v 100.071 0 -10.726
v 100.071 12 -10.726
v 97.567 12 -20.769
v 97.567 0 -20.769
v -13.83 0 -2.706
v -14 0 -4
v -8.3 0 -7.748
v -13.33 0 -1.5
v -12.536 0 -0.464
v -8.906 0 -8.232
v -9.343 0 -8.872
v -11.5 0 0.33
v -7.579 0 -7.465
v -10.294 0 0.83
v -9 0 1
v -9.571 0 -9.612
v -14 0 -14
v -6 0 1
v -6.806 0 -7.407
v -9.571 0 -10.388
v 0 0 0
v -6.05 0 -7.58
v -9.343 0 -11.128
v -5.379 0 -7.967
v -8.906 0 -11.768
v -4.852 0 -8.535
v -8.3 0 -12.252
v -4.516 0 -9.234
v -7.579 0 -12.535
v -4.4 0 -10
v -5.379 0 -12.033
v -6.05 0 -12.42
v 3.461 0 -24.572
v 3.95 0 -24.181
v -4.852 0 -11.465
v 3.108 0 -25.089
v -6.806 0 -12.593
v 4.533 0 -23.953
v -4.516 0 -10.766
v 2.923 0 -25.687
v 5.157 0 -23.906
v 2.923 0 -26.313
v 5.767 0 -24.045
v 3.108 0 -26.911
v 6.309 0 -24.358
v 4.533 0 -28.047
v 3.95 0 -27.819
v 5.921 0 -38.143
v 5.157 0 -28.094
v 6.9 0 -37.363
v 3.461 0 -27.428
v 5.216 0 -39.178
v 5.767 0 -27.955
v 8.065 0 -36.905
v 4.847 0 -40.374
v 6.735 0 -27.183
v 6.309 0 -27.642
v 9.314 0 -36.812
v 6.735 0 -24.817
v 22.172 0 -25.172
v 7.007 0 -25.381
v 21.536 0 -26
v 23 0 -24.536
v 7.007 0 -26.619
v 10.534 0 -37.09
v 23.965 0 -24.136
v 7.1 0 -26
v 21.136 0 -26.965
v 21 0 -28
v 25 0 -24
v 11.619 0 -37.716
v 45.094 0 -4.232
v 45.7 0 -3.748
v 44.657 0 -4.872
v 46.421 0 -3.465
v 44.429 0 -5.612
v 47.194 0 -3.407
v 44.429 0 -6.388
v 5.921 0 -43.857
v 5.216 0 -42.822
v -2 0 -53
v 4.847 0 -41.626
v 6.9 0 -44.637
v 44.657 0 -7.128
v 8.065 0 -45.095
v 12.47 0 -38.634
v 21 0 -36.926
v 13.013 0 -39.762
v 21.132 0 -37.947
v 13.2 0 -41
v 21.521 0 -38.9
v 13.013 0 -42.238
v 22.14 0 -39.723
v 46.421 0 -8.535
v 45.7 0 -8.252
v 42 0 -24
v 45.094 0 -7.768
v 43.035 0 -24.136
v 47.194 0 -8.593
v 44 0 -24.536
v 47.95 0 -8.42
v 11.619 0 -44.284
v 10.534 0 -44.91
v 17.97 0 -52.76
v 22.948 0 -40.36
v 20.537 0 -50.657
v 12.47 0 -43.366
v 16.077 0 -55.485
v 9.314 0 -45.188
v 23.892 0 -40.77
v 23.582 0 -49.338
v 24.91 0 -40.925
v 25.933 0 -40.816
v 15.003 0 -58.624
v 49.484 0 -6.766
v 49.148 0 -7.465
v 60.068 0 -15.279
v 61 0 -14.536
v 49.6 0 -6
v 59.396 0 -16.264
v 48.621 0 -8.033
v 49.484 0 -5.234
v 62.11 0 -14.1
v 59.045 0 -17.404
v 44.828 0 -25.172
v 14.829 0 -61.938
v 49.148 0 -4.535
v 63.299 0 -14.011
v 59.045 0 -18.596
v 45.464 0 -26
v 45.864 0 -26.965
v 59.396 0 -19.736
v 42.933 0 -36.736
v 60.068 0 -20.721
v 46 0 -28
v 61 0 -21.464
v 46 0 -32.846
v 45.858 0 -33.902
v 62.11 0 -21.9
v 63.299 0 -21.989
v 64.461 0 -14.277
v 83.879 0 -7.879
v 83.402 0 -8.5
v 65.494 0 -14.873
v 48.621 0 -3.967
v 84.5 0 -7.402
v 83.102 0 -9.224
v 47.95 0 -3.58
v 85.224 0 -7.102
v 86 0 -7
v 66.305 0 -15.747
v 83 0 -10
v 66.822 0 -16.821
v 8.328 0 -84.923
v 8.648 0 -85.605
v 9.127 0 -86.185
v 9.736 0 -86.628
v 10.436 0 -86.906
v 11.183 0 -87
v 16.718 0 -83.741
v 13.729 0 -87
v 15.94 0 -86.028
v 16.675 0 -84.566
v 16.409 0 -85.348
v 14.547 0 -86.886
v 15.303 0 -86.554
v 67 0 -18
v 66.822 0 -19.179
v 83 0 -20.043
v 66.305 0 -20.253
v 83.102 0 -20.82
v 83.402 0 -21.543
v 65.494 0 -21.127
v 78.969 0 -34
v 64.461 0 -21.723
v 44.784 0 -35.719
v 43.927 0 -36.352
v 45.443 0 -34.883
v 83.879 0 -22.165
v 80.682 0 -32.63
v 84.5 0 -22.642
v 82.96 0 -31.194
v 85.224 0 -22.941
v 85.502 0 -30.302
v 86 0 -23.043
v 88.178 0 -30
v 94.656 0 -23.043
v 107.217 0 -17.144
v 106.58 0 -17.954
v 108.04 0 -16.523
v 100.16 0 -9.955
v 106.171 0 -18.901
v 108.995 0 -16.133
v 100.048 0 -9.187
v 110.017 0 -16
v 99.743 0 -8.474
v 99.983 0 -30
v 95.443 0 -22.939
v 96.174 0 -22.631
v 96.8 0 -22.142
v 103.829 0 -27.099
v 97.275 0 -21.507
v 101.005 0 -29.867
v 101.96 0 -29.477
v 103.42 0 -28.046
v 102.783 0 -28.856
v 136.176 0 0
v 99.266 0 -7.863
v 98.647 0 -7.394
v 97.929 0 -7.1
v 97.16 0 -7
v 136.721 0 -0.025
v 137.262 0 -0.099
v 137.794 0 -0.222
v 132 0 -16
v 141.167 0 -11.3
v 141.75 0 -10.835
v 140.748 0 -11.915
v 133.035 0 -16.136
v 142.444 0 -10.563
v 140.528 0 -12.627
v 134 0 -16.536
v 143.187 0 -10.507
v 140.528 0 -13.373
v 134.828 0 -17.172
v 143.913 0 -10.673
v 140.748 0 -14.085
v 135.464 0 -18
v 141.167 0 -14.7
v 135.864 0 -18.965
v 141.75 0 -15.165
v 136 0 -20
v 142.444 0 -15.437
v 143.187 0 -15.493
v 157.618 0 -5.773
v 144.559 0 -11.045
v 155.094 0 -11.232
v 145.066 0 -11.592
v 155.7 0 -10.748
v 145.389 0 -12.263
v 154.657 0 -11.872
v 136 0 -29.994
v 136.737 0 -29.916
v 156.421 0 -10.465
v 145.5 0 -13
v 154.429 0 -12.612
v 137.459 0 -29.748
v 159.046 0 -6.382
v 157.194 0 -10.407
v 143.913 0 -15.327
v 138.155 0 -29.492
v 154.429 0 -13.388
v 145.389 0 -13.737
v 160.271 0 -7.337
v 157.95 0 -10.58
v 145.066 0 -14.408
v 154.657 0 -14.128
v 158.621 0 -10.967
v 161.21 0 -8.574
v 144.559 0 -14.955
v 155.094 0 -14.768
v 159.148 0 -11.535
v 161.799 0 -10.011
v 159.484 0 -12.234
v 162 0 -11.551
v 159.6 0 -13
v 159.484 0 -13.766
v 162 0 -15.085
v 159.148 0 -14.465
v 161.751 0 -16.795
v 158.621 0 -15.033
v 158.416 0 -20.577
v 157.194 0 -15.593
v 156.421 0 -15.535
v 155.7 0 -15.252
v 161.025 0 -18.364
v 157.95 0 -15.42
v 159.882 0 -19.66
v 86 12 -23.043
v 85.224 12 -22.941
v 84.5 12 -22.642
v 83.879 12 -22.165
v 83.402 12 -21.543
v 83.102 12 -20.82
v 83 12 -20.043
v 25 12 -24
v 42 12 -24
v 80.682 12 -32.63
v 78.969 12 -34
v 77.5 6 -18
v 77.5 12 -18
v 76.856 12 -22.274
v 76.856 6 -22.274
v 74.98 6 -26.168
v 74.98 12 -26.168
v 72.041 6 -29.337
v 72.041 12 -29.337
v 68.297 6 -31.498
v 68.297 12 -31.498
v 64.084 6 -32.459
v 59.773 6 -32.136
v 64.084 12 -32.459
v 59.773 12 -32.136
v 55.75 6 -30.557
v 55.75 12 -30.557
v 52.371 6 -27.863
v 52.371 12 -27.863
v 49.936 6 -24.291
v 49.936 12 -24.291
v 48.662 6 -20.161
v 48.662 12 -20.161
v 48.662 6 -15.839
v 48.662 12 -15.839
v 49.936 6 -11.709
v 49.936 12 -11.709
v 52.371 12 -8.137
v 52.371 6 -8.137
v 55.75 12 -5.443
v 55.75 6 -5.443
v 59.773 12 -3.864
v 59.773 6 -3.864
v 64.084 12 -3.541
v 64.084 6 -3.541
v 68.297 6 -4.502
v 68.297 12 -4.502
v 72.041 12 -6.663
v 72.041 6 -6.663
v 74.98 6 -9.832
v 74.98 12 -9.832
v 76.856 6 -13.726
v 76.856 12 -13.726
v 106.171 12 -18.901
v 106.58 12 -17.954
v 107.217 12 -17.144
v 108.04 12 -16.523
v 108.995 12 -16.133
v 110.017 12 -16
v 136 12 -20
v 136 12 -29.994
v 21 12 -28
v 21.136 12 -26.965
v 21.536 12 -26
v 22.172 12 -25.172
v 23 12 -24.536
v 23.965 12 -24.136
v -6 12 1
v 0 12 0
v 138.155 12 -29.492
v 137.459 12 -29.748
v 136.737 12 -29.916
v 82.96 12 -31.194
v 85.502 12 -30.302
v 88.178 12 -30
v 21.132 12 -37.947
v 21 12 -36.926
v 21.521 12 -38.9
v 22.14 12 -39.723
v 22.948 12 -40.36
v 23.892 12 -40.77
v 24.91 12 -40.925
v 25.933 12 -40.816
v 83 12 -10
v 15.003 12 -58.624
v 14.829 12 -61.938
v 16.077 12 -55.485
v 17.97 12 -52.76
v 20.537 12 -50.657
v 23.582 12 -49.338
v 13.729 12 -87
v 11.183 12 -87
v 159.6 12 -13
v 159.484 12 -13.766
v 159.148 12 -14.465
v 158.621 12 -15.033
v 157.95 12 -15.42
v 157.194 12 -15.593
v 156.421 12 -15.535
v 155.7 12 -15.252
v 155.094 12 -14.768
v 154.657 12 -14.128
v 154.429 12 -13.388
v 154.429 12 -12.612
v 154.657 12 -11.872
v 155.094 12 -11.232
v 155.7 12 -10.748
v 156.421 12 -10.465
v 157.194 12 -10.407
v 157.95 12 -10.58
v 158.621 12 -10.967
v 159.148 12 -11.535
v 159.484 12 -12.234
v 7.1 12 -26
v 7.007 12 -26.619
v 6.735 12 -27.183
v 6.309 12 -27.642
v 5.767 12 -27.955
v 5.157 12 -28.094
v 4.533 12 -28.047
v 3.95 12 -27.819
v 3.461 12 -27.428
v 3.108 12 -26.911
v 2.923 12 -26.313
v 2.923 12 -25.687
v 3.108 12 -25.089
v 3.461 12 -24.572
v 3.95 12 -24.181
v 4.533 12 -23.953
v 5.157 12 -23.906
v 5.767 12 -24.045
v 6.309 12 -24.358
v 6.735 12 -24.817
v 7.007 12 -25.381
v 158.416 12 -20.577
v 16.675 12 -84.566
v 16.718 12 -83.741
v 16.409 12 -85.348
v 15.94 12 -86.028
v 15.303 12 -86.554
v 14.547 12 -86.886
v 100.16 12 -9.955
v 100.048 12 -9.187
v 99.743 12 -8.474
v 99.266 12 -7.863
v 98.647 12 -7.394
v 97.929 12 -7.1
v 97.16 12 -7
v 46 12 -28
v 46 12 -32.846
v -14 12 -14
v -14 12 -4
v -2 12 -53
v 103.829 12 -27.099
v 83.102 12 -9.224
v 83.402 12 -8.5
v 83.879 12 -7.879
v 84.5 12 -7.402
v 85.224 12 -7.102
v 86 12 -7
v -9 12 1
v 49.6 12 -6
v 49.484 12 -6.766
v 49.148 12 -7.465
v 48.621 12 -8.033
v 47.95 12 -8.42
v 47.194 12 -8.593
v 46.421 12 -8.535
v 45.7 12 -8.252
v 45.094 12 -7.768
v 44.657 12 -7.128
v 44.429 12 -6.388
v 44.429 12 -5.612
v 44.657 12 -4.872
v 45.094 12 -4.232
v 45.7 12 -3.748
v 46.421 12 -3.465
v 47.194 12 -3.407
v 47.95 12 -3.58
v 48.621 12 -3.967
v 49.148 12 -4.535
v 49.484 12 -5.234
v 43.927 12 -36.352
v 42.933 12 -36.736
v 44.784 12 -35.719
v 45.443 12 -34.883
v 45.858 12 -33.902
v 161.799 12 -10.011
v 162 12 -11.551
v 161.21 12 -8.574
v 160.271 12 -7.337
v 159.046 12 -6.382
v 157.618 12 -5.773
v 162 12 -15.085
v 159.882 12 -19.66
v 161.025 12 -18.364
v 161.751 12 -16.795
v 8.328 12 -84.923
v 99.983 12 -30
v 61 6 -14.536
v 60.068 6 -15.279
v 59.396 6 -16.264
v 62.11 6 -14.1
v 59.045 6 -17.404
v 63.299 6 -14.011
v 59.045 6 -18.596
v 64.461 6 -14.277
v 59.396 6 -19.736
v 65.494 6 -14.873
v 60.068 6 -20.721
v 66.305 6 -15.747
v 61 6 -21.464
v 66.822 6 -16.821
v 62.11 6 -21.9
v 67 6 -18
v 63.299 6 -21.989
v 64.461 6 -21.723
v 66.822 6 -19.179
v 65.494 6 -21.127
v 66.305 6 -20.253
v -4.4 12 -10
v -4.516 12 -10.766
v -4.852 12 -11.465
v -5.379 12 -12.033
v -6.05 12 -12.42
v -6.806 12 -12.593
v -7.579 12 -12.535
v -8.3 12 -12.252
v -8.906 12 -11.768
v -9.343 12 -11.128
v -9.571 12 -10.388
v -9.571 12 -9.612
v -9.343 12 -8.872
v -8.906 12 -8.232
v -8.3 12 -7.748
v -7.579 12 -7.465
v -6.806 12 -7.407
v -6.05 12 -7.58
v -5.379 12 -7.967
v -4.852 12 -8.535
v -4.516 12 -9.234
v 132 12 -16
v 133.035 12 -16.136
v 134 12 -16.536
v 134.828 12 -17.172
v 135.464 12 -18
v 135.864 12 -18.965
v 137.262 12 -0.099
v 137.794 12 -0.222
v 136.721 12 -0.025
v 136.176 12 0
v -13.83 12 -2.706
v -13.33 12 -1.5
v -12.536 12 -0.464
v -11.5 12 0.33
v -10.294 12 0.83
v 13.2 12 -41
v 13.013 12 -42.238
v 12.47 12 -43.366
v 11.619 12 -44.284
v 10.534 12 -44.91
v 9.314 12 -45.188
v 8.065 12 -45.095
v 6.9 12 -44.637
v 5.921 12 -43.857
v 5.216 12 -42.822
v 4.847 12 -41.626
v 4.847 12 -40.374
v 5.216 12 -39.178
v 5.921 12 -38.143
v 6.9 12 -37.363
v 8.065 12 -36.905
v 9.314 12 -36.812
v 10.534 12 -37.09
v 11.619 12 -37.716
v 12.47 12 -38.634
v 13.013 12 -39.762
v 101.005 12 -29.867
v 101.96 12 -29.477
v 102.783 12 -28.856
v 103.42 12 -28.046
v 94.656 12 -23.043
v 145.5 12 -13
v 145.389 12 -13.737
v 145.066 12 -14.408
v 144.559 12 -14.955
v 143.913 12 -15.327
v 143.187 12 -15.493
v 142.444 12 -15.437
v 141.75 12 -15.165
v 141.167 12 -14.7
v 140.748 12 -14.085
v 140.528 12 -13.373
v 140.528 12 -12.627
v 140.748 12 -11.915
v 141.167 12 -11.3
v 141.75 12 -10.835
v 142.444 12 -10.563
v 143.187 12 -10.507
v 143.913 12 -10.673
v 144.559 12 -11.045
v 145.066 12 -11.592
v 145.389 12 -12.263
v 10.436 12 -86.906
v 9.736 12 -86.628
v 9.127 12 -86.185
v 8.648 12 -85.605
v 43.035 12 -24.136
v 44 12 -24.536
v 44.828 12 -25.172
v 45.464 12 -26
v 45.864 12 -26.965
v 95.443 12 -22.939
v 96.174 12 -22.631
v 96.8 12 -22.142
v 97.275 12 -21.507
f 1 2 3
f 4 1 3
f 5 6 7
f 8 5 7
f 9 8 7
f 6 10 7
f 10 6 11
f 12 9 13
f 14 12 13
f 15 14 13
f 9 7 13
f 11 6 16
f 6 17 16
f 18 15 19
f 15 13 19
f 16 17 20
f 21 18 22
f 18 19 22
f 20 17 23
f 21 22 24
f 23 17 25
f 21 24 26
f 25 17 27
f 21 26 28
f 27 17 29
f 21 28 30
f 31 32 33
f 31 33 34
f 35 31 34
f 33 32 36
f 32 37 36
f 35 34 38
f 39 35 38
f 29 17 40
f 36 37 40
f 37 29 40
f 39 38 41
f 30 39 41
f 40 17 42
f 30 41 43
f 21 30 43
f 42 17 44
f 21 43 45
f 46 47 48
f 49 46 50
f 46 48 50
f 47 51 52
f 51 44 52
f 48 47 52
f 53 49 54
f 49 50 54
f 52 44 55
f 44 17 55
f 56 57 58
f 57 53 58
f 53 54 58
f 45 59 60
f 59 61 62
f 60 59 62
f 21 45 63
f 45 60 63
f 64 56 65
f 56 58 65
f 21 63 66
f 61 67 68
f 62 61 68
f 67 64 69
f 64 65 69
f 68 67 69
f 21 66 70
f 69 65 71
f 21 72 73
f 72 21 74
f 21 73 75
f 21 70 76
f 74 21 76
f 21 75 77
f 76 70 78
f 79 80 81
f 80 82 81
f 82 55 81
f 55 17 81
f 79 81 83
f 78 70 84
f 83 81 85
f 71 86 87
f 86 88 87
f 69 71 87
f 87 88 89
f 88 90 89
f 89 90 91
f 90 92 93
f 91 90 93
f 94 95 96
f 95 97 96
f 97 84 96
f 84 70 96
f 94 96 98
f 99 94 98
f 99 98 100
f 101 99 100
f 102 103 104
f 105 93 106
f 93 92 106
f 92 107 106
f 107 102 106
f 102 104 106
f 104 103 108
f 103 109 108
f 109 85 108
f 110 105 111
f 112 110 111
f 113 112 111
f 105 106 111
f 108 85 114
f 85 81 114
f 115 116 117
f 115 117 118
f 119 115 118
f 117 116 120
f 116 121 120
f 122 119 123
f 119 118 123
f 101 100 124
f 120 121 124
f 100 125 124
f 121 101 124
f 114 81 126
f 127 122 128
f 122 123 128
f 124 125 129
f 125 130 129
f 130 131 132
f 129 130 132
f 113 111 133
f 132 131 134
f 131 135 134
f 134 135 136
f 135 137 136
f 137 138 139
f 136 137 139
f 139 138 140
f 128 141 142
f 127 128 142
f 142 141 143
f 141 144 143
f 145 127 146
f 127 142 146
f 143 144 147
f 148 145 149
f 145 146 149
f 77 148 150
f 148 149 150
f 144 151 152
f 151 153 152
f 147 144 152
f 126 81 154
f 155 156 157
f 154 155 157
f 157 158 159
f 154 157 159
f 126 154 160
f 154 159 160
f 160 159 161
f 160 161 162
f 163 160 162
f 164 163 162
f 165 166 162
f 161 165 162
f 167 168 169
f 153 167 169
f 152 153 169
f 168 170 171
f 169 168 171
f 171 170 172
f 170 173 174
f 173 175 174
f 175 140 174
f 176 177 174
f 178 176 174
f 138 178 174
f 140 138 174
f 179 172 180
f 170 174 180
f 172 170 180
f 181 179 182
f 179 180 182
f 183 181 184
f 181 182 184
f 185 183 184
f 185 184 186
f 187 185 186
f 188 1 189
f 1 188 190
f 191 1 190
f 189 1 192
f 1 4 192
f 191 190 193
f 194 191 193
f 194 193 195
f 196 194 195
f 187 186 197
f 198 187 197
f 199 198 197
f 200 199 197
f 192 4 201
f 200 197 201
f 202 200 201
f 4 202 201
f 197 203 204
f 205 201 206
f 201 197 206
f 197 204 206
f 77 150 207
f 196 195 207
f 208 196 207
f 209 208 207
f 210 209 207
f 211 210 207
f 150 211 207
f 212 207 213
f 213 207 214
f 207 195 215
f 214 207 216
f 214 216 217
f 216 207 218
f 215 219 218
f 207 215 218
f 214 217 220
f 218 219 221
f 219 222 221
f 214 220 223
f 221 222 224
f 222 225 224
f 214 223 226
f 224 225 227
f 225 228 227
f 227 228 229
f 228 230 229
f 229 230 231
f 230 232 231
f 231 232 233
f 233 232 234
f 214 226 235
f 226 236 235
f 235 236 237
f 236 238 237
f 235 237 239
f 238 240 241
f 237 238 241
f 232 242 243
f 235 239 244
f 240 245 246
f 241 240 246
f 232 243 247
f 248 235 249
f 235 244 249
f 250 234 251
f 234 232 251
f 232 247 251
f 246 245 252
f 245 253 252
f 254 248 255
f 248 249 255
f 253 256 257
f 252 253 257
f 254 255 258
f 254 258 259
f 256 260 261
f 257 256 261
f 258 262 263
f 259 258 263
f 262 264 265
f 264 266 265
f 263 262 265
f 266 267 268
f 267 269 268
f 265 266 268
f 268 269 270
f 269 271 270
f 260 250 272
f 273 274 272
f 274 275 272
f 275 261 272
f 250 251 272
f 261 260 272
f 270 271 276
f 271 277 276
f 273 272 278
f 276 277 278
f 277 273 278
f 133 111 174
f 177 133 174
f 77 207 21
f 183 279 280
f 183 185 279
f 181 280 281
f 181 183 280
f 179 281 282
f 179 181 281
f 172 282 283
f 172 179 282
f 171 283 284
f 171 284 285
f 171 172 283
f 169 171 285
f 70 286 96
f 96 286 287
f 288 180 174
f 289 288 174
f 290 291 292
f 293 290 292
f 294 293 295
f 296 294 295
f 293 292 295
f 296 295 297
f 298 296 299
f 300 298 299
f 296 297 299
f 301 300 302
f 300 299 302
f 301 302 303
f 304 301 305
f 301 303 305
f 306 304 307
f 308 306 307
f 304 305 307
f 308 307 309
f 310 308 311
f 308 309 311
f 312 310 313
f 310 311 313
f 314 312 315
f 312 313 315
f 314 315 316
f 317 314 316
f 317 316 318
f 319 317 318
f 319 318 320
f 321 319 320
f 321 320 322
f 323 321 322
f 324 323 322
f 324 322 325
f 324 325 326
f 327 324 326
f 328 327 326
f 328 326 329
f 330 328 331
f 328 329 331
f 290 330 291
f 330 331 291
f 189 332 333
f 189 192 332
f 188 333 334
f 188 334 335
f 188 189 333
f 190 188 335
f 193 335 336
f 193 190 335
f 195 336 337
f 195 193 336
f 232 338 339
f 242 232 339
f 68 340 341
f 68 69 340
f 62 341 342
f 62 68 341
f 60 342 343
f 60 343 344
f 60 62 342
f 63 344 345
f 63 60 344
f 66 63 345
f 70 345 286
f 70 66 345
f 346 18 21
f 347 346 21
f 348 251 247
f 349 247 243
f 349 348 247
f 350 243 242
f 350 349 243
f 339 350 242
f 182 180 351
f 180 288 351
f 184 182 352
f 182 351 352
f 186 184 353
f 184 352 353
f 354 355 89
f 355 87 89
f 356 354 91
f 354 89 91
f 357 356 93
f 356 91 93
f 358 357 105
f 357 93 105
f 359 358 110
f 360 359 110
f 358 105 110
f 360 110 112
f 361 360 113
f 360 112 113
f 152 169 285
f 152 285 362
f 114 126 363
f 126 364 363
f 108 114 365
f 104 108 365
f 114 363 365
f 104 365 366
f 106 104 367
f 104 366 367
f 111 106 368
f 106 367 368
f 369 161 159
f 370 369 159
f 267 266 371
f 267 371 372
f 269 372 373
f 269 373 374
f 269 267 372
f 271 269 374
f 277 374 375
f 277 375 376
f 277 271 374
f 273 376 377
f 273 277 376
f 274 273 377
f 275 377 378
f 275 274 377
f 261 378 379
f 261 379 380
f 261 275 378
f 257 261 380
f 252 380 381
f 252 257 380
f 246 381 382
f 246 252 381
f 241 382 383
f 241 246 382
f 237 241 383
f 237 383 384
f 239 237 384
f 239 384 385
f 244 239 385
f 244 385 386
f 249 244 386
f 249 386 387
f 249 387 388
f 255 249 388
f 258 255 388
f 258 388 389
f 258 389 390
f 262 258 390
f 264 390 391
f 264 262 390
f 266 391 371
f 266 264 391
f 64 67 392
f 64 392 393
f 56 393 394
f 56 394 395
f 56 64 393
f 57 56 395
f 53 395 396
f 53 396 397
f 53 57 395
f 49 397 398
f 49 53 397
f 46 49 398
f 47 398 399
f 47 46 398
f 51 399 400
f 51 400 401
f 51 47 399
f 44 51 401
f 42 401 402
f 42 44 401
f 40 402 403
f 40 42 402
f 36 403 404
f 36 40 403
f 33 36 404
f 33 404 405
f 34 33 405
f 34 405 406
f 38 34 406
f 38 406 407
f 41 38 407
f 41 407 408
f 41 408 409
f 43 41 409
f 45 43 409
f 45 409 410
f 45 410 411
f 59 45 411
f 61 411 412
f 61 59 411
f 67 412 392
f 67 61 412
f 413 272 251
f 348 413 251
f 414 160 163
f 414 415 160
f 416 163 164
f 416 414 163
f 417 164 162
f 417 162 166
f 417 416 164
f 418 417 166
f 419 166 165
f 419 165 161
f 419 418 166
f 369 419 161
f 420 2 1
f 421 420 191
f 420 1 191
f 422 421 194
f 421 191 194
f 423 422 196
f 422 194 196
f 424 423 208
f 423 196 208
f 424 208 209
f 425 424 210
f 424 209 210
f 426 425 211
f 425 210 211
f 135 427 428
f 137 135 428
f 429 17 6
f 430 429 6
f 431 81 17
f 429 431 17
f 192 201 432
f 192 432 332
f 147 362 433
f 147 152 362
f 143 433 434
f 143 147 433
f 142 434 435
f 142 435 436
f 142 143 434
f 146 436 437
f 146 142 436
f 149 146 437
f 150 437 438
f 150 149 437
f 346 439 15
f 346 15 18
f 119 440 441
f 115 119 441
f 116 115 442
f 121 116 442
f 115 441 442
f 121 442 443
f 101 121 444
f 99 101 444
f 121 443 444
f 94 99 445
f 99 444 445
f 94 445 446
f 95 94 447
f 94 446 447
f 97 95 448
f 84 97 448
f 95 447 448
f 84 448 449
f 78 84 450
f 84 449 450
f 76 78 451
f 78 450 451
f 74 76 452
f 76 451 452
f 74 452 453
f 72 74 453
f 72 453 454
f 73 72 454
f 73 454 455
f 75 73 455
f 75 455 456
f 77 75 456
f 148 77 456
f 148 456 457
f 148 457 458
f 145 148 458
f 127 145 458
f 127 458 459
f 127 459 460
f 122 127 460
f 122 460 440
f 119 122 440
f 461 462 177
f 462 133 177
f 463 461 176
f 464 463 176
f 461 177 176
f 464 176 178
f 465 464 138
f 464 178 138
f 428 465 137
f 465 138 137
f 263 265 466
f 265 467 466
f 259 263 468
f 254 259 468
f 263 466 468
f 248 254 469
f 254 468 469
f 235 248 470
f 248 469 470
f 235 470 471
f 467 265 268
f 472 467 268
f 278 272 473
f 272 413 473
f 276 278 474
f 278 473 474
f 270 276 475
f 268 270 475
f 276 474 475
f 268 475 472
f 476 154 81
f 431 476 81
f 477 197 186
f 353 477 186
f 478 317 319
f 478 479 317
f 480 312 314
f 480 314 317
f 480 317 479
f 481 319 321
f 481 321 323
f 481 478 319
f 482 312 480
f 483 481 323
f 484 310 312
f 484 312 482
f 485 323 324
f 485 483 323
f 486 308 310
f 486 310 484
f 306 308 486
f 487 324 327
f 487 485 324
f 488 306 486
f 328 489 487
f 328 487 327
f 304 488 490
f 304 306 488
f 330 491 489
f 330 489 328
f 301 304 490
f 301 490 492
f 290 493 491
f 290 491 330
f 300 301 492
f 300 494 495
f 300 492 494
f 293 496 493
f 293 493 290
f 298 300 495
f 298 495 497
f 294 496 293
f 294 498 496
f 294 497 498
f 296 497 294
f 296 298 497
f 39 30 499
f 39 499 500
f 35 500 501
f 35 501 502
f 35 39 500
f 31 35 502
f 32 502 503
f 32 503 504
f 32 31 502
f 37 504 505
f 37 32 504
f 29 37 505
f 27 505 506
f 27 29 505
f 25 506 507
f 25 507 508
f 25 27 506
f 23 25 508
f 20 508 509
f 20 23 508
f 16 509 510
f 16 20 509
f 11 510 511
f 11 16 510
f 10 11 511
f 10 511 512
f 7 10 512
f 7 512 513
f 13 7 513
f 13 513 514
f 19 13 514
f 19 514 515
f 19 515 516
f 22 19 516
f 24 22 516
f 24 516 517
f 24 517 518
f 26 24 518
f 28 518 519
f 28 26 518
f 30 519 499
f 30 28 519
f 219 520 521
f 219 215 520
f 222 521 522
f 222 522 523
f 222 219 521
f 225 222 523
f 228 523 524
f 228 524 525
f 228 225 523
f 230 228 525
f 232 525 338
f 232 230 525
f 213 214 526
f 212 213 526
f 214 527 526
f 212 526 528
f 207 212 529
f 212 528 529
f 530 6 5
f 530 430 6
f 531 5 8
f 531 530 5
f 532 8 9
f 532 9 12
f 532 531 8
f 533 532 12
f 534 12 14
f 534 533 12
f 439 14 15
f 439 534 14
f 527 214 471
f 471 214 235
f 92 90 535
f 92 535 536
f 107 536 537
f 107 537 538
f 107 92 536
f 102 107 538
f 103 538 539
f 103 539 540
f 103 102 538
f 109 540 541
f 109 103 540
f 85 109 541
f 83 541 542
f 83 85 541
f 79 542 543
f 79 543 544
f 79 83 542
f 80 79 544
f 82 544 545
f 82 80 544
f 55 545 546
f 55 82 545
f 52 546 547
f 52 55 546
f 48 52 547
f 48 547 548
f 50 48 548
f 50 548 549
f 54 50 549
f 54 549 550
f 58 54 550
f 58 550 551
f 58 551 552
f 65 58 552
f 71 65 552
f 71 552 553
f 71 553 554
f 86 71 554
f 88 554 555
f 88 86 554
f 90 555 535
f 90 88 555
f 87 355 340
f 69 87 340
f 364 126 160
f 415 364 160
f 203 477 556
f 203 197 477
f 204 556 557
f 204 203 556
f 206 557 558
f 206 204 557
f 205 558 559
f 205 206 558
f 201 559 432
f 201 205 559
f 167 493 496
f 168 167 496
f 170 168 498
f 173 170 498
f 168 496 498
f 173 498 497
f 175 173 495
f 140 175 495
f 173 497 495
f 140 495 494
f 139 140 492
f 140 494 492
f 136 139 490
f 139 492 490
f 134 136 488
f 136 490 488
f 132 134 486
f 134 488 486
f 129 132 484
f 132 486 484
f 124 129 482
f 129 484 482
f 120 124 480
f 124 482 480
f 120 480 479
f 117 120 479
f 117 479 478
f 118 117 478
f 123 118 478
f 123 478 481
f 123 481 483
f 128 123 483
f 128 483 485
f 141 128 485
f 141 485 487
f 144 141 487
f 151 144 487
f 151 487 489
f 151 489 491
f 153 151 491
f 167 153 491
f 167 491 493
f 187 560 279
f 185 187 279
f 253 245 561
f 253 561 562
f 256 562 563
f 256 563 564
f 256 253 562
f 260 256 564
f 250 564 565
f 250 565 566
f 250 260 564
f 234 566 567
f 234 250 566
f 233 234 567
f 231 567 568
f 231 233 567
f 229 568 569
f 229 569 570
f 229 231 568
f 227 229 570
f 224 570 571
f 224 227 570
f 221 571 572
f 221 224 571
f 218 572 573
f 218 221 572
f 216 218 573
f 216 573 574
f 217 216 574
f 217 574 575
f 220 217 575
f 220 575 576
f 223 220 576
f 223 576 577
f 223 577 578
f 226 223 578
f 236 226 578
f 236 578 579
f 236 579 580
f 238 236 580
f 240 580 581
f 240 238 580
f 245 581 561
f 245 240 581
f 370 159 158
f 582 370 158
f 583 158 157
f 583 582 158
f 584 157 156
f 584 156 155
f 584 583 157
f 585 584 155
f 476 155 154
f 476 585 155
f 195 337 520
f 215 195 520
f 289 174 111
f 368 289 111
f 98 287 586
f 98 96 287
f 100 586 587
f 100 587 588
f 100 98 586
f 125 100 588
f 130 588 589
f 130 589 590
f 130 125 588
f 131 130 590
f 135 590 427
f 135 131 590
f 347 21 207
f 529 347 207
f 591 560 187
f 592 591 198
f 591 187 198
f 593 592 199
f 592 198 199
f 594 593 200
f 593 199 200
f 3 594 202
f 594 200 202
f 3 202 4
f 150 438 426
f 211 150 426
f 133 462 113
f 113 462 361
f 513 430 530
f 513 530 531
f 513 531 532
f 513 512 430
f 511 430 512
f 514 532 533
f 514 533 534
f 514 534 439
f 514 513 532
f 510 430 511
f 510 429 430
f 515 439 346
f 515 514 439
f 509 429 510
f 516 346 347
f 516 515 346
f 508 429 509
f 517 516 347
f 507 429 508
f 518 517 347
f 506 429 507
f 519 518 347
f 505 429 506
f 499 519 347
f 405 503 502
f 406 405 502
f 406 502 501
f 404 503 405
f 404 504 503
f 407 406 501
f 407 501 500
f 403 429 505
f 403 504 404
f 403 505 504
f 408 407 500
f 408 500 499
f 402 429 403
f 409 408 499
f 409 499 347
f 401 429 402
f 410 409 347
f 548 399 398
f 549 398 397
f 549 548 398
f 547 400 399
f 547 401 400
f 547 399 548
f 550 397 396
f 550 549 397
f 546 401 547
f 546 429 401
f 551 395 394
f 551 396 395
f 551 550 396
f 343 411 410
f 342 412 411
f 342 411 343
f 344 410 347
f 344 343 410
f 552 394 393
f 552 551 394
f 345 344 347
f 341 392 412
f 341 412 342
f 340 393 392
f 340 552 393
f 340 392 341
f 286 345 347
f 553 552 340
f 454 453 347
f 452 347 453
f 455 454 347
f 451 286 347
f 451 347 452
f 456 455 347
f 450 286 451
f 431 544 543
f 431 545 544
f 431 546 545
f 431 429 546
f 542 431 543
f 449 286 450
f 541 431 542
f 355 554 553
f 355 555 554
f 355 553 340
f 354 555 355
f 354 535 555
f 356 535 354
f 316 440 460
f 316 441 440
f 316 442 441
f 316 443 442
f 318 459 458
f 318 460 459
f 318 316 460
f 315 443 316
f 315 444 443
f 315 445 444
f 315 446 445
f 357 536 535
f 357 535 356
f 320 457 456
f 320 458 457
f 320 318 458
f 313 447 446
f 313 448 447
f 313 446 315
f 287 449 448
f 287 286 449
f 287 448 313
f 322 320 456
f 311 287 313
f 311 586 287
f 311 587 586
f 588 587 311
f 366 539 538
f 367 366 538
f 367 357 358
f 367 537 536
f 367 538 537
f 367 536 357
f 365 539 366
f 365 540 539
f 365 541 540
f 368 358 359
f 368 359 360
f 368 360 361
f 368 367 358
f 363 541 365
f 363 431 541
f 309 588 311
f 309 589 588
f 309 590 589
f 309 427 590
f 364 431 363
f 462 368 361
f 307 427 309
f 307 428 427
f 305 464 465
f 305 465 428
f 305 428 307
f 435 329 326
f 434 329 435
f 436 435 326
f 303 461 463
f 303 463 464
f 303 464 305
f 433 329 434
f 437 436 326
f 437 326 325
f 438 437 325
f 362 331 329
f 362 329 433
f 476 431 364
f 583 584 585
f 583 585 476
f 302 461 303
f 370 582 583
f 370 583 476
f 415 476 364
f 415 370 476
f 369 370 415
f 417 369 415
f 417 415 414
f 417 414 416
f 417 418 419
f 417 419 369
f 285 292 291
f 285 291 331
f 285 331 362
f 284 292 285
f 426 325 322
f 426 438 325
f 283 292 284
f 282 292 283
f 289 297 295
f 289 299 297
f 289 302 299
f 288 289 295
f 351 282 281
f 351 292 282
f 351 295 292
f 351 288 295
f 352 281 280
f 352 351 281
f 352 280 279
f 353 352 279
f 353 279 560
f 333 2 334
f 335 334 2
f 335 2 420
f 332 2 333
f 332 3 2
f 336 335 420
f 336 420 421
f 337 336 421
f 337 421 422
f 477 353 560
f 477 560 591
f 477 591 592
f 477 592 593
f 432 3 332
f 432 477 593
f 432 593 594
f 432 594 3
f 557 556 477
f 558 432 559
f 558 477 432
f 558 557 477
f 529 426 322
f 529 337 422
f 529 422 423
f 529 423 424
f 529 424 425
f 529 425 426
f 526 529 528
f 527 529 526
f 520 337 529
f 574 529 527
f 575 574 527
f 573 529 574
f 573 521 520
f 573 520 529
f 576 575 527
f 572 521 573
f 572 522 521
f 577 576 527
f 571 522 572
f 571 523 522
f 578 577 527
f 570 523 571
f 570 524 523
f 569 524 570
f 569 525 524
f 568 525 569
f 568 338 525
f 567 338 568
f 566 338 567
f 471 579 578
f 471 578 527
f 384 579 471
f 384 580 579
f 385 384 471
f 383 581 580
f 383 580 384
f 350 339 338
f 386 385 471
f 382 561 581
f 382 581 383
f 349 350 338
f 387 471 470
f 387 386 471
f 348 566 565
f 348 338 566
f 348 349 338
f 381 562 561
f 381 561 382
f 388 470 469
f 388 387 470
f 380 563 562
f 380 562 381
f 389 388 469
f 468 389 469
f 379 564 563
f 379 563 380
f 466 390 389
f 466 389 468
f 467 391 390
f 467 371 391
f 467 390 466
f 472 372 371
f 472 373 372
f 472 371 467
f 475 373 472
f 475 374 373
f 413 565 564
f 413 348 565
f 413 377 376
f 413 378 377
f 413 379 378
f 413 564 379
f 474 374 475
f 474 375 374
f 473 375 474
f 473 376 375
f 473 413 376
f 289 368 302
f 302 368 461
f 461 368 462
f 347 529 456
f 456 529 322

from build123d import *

# Parameters (mm, degrees)
SKETCH1_R           = 2.6
SKETCH1_R_2         = 2.1
SKETCH1_R_3         = 4.2
SKETCH1_R_4         = 2.5
BOSS_EXTRUDE1_DEPTH = 12
FILLET2_R           = 6
FILLET3_R           = 3
CUT_EXTRUDE1_DEPTH  = 13
SKETCH5_R           = 4
CUT_EXTRUDE2_DEPTH  = 13
SKETCH6_R           = 14.5
CUT_EXTRUDE3_DEPTH  = 6
FILLET4_R           = 12
SKETCH7_R           = 2.6
CUT_EXTRUDE4_DEPTH  = 13
FILLET6_R           = 3
FILLET8_R           = 5
FILLET9_R           = 4
CUT_EXTRUDE6_DEPTH  = 13
FILLET10_R          = 4


with BuildPart() as part:
    # Sketch1 → Boss-Extrude1 (new body)
    with BuildSketch(Plane(origin=(0, 0, 0), x_dir=(1, 0, 0), z_dir=(0, 1, 0))):
        Polygon((162, 19), (137, 30), (83.968719423, 30), (78.968719423, 34), (13.968719423, 52), (17, 87), (9, 87), (-2, 53), (-14, 14), (-14, 2), (-14, -1), (-6, -1), (0, 0), (137, 0), (162, 7), align=None)
        with Locations((-7, 10)):
            Circle(SKETCH1_R, mode=Mode.SUBTRACT)
        with Locations((157, 13)):
            Circle(SKETCH1_R, mode=Mode.SUBTRACT)
        with Locations((5, 26)):
            Circle(SKETCH1_R_2, mode=Mode.SUBTRACT)
        with Locations((9, 41)):
            Circle(SKETCH1_R_3, mode=Mode.SUBTRACT)
        with Locations((143, 13)):
            Circle(SKETCH1_R_4, mode=Mode.SUBTRACT)
    extrude(amount=BOSS_EXTRUDE1_DEPTH)

    # Fillet2
    fillet2_edges = [part.edges().sort_by_distance(p)[0] for p in [
        (137, 6, -30),
        (162, 6, -19),
        (162, 6, -7),
        (137, 6, 0),
    ]]
    fillet(fillet2_edges, radius=FILLET2_R)

    # Fillet3
    fillet3_edges = [part.edges().sort_by_distance(p)[0] for p in [
        (9, 6, -87),
        (17, 6, -87),
    ]]
    fillet(fillet3_edges, radius=FILLET3_R)

    # Sketch4 → Cut-Extrude1 (cut, through all)
    with BuildSketch(Plane(origin=(0, 12, 0), x_dir=(1, 0, 0), z_dir=(0, 1, 0))):
        Polygon((21, 42), (21, 24), (46, 24), (46, 36), align=None)
        Polygon((97, 23.043498828), (83, 23.043498828), (83, 7), (101, 7), align=None)
    extrude(amount=-CUT_EXTRUDE1_DEPTH, mode=Mode.SUBTRACT)

    # Sketch5 → Cut-Extrude2 (cut, through all)
    with BuildSketch(Plane(origin=(0, 12, 0), x_dir=(1, 0, 0), z_dir=(0, 1, 0))):
        with Locations((63, 18)):
            Circle(SKETCH5_R)
    extrude(amount=-CUT_EXTRUDE2_DEPTH, mode=Mode.SUBTRACT)

    # Sketch6 → Cut-Extrude3 (cut)
    with BuildSketch(Plane(origin=(0, 12, 0), x_dir=(1, 0, 0), z_dir=(0, 1, 0))):
        with Locations((63, 18)):
            Circle(SKETCH6_R)
    extrude(amount=-CUT_EXTRUDE3_DEPTH, mode=Mode.SUBTRACT)

    # Fillet4
    fillet4_edges = [part.edges().sort_by_distance(p)[0] for p in [
        (13.968719423, 6, -52),
        (83.968719423, 6, -30),
    ]]
    fillet(fillet4_edges, radius=FILLET4_R)

    # Sketch7 → Cut-Extrude4 (cut, through all)
    with BuildSketch(Plane(origin=(0, 12, 0), x_dir=(1, 0, 0), z_dir=(0, 1, 0))):
        with Locations((47, 6)):
            Circle(SKETCH7_R)
    extrude(amount=-CUT_EXTRUDE4_DEPTH, mode=Mode.SUBTRACT)

    # Fillet6
    fillet6_edges = [part.edges().sort_by_distance(p)[0] for p in [
        (97, 6, -23.043498828),
        (101, 6, -7),
        (83, 6, -7),
        (83, 6, -23.043498828),
    ]]
    fillet(fillet6_edges, radius=FILLET6_R)

    # Fillet8
    fillet8_edges = [part.edges().sort_by_distance(p)[0] for p in [
        (-14, 6, 1),
    ]]
    fillet(fillet8_edges, radius=FILLET8_R)

    # Fillet9
    fillet9_edges = [part.edges().sort_by_distance(p)[0] for p in [
        (21, 6, -42),
        (46, 6, -36),
        (46, 6, -24),
        (21, 6, -24),
    ]]
    fillet(fillet9_edges, radius=FILLET9_R)

    # Sketch10 → Cut-Extrude6 (cut, through all)
    with BuildSketch(Plane(origin=(0, 12, 0), x_dir=(1, 0, 0), z_dir=(0, 1, 0))):
        Polygon((103, 30), (107, 16), (136, 16), (136, 30), align=None)
    extrude(amount=-CUT_EXTRUDE6_DEPTH, mode=Mode.SUBTRACT)

    # Fillet10
    fillet10_edges = [part.edges().sort_by_distance(p)[0] for p in [
        (103, 6, -30),
        (136, 6, -16),
        (107, 6, -16),
    ]]
    fillet(fillet10_edges, radius=FILLET10_R)


solid = part.part
